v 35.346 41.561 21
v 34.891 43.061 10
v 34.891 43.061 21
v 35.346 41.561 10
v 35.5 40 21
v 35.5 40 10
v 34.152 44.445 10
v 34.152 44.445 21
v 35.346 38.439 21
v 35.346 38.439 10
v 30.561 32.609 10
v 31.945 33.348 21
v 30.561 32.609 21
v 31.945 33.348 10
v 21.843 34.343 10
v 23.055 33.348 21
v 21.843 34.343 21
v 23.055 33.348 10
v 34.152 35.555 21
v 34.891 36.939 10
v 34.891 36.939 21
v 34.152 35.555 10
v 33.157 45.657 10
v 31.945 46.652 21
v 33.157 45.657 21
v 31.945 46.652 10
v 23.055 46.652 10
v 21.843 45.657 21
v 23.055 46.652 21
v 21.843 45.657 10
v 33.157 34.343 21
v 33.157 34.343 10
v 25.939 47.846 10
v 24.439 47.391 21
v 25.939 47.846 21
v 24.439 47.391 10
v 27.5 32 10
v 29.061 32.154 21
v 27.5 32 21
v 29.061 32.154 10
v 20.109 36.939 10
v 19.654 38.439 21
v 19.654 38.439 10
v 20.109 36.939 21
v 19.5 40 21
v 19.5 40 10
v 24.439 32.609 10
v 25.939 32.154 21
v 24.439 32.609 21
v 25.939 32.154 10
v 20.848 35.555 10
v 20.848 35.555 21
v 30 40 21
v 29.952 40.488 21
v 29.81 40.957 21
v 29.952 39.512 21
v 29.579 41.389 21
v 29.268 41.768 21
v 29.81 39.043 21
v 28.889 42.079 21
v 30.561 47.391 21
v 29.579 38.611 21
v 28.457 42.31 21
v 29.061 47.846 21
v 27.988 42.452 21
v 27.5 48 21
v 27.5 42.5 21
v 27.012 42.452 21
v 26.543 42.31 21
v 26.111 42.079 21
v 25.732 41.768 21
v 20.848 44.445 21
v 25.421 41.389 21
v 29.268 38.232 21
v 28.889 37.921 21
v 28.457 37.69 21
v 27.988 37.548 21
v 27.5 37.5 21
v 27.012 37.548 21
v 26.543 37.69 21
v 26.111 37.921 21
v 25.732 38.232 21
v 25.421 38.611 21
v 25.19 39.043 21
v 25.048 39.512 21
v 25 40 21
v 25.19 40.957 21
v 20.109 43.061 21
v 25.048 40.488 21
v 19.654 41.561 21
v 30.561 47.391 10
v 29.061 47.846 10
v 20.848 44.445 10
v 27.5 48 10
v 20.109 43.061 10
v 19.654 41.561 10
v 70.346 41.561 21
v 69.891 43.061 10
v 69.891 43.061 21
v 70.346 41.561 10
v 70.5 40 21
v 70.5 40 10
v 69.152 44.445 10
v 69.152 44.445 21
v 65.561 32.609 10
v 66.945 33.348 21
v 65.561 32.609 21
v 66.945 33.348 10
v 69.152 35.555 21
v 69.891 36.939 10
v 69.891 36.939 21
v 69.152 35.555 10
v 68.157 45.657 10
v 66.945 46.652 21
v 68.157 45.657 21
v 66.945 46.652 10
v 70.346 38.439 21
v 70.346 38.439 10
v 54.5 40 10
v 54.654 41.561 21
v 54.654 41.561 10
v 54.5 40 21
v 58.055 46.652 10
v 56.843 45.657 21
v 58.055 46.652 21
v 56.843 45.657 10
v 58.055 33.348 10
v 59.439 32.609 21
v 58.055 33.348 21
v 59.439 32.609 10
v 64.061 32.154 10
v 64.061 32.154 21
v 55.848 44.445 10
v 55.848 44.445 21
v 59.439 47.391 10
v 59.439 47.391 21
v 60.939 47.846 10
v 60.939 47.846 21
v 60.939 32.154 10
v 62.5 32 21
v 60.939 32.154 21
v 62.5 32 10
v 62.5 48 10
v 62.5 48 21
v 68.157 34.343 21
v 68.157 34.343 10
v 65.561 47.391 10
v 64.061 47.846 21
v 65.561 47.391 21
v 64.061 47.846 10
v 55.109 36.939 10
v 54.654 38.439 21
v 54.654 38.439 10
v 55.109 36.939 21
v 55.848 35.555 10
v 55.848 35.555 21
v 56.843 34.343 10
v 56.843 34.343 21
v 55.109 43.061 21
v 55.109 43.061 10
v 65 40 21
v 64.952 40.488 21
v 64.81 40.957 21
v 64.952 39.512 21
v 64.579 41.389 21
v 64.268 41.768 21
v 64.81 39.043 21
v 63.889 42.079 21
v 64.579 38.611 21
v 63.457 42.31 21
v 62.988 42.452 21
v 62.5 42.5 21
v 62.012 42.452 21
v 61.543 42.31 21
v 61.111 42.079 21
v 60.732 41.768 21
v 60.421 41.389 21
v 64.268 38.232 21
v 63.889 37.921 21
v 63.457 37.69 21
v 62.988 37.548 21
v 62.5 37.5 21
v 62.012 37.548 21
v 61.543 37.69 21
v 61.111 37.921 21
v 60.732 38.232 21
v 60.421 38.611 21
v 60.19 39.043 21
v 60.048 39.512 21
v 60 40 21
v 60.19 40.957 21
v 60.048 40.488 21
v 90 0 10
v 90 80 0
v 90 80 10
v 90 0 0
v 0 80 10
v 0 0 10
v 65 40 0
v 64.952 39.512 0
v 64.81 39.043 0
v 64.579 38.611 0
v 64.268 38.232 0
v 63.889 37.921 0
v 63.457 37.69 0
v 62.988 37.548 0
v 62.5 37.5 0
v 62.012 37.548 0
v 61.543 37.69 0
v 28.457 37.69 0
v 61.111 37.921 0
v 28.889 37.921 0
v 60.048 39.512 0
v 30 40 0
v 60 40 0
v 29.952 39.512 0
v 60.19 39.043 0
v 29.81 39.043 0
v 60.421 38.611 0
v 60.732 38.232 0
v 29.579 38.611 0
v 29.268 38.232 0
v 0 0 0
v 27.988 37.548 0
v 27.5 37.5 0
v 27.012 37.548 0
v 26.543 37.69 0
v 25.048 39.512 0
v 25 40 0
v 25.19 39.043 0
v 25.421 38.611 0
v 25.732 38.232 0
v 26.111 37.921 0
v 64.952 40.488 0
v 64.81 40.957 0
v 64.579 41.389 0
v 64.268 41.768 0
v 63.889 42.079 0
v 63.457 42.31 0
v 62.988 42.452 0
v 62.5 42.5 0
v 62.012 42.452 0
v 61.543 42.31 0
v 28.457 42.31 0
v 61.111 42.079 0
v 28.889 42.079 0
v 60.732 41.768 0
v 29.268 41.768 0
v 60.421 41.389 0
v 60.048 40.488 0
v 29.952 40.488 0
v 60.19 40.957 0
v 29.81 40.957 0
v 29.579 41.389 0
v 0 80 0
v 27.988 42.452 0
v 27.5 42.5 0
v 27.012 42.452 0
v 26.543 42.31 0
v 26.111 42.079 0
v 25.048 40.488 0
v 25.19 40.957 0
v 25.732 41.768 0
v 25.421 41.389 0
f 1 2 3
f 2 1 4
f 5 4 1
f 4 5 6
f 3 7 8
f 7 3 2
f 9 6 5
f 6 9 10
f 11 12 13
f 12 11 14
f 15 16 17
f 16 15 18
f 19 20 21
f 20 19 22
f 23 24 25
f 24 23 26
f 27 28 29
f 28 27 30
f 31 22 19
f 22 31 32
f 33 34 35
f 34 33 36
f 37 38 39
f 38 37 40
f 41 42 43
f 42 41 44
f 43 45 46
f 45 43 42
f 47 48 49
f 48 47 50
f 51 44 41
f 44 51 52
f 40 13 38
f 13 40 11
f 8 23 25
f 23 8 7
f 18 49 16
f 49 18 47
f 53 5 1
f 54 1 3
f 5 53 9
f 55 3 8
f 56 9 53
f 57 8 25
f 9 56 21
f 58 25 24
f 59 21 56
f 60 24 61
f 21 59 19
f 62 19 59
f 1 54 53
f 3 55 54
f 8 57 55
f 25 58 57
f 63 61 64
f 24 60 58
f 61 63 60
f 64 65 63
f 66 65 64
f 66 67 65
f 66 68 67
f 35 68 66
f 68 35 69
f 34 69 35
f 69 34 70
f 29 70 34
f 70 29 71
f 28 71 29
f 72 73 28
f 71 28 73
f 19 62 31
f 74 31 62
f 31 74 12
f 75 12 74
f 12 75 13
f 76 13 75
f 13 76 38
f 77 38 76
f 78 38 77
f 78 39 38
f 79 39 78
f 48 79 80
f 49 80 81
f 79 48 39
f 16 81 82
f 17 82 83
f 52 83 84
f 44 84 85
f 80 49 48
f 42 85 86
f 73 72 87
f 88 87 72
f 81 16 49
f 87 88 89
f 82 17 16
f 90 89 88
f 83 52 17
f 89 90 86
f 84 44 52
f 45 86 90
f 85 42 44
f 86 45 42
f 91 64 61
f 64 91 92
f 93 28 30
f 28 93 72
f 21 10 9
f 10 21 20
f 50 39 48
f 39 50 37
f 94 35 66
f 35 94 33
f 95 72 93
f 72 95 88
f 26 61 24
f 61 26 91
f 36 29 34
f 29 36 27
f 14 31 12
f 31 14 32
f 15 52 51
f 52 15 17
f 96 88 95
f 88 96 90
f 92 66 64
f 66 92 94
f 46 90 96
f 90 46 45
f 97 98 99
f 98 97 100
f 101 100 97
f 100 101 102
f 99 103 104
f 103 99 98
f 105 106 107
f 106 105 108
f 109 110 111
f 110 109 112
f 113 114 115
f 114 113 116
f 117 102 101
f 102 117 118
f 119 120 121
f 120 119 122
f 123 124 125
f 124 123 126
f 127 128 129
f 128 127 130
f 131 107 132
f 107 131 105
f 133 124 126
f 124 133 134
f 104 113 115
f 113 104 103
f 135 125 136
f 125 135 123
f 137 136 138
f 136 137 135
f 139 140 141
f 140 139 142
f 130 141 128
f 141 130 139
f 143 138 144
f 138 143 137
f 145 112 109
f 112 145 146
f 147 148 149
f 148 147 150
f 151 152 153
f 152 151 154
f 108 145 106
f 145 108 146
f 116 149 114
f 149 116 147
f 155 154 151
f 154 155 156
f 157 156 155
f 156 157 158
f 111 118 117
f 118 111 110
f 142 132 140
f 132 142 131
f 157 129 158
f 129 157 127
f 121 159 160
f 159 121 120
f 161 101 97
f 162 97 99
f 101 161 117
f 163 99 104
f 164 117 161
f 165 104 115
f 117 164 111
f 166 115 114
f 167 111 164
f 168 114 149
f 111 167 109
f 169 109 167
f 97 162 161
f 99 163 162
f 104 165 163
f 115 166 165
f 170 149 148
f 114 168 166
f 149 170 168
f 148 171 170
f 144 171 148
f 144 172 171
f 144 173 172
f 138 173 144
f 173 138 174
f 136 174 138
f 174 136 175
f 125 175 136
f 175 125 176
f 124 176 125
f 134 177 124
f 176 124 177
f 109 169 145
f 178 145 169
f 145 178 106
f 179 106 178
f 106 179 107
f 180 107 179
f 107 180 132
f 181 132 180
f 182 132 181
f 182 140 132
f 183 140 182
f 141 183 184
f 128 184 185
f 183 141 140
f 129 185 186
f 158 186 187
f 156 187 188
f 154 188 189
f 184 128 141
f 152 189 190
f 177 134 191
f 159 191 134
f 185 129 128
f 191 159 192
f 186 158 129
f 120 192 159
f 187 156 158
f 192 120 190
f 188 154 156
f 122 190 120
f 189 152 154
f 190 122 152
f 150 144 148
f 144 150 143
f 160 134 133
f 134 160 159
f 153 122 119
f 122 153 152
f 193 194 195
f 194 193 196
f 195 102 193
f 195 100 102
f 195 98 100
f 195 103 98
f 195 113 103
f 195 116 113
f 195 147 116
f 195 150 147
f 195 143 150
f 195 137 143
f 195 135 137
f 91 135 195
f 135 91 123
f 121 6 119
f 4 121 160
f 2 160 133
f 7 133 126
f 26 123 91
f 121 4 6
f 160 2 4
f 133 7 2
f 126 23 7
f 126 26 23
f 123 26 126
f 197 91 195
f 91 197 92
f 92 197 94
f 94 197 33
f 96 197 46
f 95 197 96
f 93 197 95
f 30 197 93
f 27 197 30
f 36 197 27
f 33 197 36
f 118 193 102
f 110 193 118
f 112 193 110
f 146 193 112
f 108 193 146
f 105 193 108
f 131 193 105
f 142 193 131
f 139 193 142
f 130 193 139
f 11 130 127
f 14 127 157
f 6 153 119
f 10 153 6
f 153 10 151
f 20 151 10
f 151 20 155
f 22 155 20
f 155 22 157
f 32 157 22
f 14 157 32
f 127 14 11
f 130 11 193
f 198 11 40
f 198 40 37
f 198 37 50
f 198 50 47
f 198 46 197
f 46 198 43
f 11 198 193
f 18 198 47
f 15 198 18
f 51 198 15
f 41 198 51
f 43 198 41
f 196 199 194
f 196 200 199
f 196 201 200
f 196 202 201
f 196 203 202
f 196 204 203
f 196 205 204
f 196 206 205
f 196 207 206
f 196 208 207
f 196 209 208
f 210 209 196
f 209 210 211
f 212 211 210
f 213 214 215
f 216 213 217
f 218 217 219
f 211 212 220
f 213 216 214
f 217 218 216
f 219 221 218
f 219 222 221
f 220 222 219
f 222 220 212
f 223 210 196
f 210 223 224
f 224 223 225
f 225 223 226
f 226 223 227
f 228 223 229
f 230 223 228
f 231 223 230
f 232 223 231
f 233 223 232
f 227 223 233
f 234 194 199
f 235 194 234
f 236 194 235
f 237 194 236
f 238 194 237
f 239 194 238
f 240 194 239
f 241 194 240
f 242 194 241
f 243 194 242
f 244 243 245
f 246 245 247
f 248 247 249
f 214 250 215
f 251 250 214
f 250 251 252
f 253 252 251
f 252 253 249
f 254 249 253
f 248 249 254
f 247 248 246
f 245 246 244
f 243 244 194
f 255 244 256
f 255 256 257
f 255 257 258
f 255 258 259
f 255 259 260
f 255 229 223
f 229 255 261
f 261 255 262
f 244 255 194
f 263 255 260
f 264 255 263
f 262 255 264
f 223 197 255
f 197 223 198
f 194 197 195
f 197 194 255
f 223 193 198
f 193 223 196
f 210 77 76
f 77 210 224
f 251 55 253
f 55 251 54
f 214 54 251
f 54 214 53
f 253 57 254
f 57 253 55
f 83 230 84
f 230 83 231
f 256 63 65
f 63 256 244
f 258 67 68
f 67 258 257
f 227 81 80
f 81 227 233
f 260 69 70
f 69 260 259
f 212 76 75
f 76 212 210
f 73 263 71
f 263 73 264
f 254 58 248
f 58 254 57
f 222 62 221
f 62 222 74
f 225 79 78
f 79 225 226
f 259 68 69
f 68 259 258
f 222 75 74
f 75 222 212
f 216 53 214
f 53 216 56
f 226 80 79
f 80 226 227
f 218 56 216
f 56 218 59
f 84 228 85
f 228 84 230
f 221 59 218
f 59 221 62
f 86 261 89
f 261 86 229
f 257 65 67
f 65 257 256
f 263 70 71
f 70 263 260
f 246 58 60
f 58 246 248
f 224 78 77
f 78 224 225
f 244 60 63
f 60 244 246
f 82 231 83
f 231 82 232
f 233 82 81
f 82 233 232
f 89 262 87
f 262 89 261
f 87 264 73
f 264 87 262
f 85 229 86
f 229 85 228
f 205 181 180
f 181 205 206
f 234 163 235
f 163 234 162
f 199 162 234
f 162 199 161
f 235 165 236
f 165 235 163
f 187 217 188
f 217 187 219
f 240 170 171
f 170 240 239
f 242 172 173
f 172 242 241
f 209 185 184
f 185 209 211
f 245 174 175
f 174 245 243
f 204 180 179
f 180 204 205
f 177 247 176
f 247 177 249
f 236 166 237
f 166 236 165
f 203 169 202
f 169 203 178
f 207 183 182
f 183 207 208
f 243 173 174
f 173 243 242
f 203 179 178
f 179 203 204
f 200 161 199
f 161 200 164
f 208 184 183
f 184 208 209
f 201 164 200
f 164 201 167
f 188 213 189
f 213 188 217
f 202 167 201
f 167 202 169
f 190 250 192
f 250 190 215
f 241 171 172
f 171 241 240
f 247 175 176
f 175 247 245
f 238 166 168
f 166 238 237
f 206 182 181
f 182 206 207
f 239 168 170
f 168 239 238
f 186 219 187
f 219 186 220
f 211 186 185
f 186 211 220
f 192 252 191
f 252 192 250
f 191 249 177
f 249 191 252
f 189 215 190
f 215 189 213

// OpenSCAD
$fn = 32;

// ----------------------------------------------------------------------
// Drill jig: two_boss jig
// ----------------------------------------------------------------------

// --- parameters (mm) ---
plate_l = 90;             // plate length, X
plate_w = 80;             // plate width, Y
plate_t = 10;             // plate thickness
boss_d = 16;              // guide boss diameter
boss_h = 12;              // boss height above the plate
guide_d = 5;              // guide hole diameter
boss_pitch = 35;          // boss pitch
fit_tol = 0.1;            // tolerance for press fits, mm
free_tol = 0.5;           // tolerance for clearance fits, mm

n_boss = 2;  // guide bosses
boss_x0 = (plate_l - (n_boss - 1) * boss_pitch) / 2;  // first boss X
boss_top = plate_t - 1 + boss_h;  // boss crown height
total_h = boss_top;  // overall height

difference() {
  union() {
  cube([plate_l, plate_w, plate_t]);
  for (i = [0 : n_boss - 1])
    translate([boss_x0 + i * boss_pitch, plate_w / 2, plate_t - 1])
      cylinder(h = boss_h, d = boss_d);
  }
  for (i = [0 : n_boss - 1])
    translate([boss_x0 + i * boss_pitch, plate_w / 2, -1])
      cylinder(h = plate_t + boss_h, d = guide_d);
}
